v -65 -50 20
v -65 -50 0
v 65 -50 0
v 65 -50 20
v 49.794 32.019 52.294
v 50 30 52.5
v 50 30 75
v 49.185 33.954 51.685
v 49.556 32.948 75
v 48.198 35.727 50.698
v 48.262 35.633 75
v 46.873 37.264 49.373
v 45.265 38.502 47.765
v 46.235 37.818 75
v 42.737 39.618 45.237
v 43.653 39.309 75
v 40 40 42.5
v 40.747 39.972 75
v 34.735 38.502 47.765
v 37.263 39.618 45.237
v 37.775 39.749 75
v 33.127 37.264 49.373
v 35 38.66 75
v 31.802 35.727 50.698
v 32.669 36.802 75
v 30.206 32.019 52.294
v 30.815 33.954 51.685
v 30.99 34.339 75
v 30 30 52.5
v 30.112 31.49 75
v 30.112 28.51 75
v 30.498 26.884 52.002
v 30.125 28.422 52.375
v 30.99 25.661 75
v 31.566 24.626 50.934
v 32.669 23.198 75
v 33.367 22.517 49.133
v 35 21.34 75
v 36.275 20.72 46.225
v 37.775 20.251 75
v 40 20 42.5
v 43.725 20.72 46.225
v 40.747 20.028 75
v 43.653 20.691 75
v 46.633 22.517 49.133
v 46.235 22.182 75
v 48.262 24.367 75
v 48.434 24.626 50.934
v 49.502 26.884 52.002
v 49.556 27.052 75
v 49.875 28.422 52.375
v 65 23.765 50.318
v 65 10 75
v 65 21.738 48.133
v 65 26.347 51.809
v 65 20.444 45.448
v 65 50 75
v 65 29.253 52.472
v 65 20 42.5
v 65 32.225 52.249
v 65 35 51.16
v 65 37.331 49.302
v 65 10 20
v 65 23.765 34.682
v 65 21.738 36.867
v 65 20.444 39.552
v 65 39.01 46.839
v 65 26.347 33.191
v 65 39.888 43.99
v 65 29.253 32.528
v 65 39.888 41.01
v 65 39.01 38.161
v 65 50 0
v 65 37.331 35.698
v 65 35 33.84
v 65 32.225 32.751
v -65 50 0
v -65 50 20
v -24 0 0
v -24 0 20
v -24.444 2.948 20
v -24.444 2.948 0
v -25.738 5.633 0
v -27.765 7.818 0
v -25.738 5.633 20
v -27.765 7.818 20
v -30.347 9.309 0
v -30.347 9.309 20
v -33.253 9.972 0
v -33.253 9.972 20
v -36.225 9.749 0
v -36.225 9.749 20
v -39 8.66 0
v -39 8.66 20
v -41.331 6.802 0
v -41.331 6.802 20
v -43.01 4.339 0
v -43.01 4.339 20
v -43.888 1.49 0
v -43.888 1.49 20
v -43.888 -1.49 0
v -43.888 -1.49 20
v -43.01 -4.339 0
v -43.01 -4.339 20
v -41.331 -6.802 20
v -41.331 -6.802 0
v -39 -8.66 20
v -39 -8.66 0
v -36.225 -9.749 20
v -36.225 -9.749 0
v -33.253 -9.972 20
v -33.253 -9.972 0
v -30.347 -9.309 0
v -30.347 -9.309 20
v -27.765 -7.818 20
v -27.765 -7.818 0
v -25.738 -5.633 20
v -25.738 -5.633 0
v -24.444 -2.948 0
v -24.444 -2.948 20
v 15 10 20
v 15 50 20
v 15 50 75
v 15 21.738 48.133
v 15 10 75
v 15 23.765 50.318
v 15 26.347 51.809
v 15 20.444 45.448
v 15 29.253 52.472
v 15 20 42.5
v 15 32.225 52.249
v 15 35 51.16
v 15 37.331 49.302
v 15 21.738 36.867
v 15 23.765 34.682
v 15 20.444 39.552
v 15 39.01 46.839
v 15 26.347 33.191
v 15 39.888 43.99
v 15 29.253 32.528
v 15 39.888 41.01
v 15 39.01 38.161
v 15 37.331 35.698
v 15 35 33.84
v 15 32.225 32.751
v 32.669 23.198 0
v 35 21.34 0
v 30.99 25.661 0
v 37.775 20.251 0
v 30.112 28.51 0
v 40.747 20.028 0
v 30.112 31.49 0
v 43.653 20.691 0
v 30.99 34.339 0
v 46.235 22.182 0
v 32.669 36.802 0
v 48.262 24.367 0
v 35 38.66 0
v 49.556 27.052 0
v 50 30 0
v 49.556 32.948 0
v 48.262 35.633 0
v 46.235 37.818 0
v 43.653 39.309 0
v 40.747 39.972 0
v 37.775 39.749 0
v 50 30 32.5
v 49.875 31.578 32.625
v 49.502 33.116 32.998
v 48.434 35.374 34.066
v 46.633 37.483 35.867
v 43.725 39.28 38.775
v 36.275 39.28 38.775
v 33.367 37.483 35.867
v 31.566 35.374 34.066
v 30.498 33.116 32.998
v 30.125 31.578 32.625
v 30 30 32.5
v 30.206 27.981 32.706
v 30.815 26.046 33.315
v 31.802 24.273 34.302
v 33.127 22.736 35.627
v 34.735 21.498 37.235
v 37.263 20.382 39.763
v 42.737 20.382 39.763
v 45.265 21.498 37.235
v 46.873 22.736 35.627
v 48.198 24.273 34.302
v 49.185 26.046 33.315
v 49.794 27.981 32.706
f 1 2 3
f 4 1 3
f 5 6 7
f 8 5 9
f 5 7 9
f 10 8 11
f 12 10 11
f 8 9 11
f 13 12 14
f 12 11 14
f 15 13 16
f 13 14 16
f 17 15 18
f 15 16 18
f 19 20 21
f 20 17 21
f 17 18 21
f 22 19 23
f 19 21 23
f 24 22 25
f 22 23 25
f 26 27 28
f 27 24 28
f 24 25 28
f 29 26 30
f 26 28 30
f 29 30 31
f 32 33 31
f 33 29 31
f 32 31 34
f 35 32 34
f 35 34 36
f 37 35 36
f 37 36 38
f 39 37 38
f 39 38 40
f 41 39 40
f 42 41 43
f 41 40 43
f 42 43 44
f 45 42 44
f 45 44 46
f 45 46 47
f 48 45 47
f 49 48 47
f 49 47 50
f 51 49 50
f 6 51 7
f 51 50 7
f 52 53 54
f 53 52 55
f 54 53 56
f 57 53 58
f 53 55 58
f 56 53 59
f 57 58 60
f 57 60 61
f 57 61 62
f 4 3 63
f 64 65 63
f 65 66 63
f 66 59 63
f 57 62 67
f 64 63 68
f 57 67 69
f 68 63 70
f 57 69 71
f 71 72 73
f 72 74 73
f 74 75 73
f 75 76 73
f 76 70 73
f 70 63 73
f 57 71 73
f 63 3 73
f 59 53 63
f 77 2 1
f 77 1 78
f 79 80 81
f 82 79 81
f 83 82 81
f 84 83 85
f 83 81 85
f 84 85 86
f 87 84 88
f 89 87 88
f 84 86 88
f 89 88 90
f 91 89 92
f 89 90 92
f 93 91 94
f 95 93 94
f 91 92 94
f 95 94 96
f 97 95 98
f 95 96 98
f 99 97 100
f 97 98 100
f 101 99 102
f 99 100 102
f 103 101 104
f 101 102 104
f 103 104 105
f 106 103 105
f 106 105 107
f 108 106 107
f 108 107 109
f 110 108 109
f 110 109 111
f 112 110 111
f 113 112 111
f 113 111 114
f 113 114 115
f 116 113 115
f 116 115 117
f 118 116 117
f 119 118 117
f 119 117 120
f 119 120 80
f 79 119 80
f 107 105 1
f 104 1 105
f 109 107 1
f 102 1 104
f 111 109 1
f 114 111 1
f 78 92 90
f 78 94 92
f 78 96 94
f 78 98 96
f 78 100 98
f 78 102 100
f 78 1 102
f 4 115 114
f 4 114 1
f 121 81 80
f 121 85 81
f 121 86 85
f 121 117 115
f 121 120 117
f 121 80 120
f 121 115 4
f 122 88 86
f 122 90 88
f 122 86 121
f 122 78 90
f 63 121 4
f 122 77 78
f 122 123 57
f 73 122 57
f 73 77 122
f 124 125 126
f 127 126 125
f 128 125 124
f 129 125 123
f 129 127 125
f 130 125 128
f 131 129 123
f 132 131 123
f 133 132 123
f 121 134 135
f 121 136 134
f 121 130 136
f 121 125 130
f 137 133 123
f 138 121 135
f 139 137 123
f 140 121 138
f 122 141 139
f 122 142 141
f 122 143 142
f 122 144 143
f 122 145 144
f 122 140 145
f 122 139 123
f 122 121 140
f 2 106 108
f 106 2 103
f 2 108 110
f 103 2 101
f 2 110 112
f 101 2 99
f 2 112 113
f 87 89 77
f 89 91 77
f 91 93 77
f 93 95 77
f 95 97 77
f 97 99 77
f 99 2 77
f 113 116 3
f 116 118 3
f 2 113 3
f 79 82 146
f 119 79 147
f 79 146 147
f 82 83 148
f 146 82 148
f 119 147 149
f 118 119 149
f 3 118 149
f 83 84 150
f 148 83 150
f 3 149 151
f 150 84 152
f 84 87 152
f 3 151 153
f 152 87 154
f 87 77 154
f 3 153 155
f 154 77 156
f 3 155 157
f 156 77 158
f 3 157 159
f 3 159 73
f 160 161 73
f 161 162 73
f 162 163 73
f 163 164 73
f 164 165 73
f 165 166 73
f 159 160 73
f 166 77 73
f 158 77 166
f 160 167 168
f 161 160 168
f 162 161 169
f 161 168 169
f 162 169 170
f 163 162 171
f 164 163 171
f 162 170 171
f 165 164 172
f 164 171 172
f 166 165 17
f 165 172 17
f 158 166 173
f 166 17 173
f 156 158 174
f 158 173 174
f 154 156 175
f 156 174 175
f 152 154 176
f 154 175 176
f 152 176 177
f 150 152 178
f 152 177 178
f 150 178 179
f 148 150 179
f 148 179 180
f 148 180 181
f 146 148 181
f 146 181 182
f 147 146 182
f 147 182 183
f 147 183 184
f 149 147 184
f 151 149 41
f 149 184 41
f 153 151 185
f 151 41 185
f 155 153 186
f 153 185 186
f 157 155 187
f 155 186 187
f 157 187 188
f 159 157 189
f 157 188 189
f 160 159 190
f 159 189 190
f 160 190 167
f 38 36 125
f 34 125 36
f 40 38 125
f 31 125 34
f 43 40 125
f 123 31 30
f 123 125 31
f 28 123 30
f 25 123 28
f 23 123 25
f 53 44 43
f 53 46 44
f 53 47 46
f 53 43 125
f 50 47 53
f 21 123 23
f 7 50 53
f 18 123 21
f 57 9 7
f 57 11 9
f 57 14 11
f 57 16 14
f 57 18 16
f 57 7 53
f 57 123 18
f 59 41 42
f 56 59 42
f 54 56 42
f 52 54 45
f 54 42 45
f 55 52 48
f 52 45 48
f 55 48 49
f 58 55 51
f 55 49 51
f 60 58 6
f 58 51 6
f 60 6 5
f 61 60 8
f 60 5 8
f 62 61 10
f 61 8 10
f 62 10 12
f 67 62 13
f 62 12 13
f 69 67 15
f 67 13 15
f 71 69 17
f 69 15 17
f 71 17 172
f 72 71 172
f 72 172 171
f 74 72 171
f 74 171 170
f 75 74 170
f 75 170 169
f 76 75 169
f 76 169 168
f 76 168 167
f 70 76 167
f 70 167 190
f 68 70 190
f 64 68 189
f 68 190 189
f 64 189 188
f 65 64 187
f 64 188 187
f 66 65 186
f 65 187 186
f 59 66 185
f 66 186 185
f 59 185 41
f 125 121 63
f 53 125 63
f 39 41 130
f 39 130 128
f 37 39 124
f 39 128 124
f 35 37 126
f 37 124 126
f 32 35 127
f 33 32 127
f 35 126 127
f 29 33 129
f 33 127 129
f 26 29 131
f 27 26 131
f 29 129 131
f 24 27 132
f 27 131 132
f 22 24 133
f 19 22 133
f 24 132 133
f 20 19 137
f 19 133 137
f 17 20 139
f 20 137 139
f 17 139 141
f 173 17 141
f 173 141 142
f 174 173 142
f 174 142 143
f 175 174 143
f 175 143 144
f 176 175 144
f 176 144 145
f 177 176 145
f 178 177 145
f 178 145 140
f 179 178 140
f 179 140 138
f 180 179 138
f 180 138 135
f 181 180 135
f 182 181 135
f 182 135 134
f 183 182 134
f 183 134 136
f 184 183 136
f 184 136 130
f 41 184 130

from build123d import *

# Parameters (mm, degrees)
SKETCH_1_W          = 130
SKETCH_1_H          = 100
EXTRUDE_1_DEPTH     = 20
SKETCH_2_W          = 60
SKETCH_2_H          = 76
SKETCH_2_W_2        = 38
CUT_EXTRUDE_1_DEPTH = 10
SKETCH_3_W          = 50
SKETCH_3_H          = 40
EXTRUDE_2_DEPTH     = 65
SKETCH_4_R          = 10
CUT_EXTRUDE_2_DEPTH = 105.642247682
SKETCH_5_R          = 10
CUT_EXTRUDE_3_DEPTH = 121.519707932
SKETCH_6_R          = 10
CUT_EXTRUDE_4_DEPTH = 112.130553854
EXTRUDE_START       = 10
SKETCH_7_W          = 38
SKETCH_7_H          = 76
SKETCH_7_R          = 10
EXTRUDE_3_DEPTH     = 10


with BuildPart() as part:
    # Эскиз1 → Бобышка-Вытянуть1 (new body)
    with BuildSketch(Plane.XY):
        Rectangle(SKETCH_1_W, SKETCH_1_H)
    extrude(amount=EXTRUDE_1_DEPTH)

    # Эскиз2 → Вырез-Вытянуть1 (cut)
    with BuildSketch(Plane.XY.offset(20)):
        with Locations((23, 0)):
            Rectangle(SKETCH_2_W, SKETCH_2_H)
        with Locations((-34, 0)):
            Rectangle(SKETCH_2_W_2, SKETCH_2_H)
    extrude(amount=-CUT_EXTRUDE_1_DEPTH, mode=Mode.SUBTRACT)

    # Эскиз3 → Бобышка-Вытянуть2 (add)
    with BuildSketch(Plane.XY.offset(10)):
        with Locations((40, 30)):
            Rectangle(SKETCH_3_W, SKETCH_3_H)
    extrude(amount=EXTRUDE_2_DEPTH)

    # Эскиз4 → Вырез-Вытянуть2 (cut, through all)
    with BuildSketch(Plane.XY.offset(10)):
        with Locations((-34, 0)):
            Circle(SKETCH_4_R)
    extrude(amount=-CUT_EXTRUDE_2_DEPTH, mode=Mode.SUBTRACT)

    # Эскиз5 → Вырез-Вытянуть3 (cut, through all)
    with BuildSketch(Plane.ZY.offset(-15)):
        with Locations(Location((42.5, 30, 0), (0, 0, 270))):
            Circle(SKETCH_5_R)
    extrude(amount=-CUT_EXTRUDE_3_DEPTH, mode=Mode.SUBTRACT)

    # Эскиз6 → Вырез-Вытянуть4 (cut, through all)
    with BuildSketch(Plane.XY.offset(75)):
        with Locations((40, 30)):
            Circle(SKETCH_6_R)
    extrude(amount=-CUT_EXTRUDE_4_DEPTH, mode=Mode.SUBTRACT)

    # Эскиз7 → Бобышка-Вытянуть3 (add)
    # profile 1 of 2: a face of its own
    with BuildSketch(Plane.XY.offset(10).offset(EXTRUDE_START)):
        Polygon((15, 10), (15, 38), (-7, 38), (-7, -38), (53, -38), (53, 10), align=None)
    # profile 2 of 2: a face of its own
    with BuildSketch(Plane.XY.offset(10).offset(EXTRUDE_START)):
        with Locations((-34, 0)):
            Rectangle(SKETCH_7_W, SKETCH_7_H)
        with Locations((-34, 0)):
            Circle(SKETCH_7_R, mode=Mode.SUBTRACT)
    extrude(amount=-EXTRUDE_3_DEPTH)


solid = part.part
